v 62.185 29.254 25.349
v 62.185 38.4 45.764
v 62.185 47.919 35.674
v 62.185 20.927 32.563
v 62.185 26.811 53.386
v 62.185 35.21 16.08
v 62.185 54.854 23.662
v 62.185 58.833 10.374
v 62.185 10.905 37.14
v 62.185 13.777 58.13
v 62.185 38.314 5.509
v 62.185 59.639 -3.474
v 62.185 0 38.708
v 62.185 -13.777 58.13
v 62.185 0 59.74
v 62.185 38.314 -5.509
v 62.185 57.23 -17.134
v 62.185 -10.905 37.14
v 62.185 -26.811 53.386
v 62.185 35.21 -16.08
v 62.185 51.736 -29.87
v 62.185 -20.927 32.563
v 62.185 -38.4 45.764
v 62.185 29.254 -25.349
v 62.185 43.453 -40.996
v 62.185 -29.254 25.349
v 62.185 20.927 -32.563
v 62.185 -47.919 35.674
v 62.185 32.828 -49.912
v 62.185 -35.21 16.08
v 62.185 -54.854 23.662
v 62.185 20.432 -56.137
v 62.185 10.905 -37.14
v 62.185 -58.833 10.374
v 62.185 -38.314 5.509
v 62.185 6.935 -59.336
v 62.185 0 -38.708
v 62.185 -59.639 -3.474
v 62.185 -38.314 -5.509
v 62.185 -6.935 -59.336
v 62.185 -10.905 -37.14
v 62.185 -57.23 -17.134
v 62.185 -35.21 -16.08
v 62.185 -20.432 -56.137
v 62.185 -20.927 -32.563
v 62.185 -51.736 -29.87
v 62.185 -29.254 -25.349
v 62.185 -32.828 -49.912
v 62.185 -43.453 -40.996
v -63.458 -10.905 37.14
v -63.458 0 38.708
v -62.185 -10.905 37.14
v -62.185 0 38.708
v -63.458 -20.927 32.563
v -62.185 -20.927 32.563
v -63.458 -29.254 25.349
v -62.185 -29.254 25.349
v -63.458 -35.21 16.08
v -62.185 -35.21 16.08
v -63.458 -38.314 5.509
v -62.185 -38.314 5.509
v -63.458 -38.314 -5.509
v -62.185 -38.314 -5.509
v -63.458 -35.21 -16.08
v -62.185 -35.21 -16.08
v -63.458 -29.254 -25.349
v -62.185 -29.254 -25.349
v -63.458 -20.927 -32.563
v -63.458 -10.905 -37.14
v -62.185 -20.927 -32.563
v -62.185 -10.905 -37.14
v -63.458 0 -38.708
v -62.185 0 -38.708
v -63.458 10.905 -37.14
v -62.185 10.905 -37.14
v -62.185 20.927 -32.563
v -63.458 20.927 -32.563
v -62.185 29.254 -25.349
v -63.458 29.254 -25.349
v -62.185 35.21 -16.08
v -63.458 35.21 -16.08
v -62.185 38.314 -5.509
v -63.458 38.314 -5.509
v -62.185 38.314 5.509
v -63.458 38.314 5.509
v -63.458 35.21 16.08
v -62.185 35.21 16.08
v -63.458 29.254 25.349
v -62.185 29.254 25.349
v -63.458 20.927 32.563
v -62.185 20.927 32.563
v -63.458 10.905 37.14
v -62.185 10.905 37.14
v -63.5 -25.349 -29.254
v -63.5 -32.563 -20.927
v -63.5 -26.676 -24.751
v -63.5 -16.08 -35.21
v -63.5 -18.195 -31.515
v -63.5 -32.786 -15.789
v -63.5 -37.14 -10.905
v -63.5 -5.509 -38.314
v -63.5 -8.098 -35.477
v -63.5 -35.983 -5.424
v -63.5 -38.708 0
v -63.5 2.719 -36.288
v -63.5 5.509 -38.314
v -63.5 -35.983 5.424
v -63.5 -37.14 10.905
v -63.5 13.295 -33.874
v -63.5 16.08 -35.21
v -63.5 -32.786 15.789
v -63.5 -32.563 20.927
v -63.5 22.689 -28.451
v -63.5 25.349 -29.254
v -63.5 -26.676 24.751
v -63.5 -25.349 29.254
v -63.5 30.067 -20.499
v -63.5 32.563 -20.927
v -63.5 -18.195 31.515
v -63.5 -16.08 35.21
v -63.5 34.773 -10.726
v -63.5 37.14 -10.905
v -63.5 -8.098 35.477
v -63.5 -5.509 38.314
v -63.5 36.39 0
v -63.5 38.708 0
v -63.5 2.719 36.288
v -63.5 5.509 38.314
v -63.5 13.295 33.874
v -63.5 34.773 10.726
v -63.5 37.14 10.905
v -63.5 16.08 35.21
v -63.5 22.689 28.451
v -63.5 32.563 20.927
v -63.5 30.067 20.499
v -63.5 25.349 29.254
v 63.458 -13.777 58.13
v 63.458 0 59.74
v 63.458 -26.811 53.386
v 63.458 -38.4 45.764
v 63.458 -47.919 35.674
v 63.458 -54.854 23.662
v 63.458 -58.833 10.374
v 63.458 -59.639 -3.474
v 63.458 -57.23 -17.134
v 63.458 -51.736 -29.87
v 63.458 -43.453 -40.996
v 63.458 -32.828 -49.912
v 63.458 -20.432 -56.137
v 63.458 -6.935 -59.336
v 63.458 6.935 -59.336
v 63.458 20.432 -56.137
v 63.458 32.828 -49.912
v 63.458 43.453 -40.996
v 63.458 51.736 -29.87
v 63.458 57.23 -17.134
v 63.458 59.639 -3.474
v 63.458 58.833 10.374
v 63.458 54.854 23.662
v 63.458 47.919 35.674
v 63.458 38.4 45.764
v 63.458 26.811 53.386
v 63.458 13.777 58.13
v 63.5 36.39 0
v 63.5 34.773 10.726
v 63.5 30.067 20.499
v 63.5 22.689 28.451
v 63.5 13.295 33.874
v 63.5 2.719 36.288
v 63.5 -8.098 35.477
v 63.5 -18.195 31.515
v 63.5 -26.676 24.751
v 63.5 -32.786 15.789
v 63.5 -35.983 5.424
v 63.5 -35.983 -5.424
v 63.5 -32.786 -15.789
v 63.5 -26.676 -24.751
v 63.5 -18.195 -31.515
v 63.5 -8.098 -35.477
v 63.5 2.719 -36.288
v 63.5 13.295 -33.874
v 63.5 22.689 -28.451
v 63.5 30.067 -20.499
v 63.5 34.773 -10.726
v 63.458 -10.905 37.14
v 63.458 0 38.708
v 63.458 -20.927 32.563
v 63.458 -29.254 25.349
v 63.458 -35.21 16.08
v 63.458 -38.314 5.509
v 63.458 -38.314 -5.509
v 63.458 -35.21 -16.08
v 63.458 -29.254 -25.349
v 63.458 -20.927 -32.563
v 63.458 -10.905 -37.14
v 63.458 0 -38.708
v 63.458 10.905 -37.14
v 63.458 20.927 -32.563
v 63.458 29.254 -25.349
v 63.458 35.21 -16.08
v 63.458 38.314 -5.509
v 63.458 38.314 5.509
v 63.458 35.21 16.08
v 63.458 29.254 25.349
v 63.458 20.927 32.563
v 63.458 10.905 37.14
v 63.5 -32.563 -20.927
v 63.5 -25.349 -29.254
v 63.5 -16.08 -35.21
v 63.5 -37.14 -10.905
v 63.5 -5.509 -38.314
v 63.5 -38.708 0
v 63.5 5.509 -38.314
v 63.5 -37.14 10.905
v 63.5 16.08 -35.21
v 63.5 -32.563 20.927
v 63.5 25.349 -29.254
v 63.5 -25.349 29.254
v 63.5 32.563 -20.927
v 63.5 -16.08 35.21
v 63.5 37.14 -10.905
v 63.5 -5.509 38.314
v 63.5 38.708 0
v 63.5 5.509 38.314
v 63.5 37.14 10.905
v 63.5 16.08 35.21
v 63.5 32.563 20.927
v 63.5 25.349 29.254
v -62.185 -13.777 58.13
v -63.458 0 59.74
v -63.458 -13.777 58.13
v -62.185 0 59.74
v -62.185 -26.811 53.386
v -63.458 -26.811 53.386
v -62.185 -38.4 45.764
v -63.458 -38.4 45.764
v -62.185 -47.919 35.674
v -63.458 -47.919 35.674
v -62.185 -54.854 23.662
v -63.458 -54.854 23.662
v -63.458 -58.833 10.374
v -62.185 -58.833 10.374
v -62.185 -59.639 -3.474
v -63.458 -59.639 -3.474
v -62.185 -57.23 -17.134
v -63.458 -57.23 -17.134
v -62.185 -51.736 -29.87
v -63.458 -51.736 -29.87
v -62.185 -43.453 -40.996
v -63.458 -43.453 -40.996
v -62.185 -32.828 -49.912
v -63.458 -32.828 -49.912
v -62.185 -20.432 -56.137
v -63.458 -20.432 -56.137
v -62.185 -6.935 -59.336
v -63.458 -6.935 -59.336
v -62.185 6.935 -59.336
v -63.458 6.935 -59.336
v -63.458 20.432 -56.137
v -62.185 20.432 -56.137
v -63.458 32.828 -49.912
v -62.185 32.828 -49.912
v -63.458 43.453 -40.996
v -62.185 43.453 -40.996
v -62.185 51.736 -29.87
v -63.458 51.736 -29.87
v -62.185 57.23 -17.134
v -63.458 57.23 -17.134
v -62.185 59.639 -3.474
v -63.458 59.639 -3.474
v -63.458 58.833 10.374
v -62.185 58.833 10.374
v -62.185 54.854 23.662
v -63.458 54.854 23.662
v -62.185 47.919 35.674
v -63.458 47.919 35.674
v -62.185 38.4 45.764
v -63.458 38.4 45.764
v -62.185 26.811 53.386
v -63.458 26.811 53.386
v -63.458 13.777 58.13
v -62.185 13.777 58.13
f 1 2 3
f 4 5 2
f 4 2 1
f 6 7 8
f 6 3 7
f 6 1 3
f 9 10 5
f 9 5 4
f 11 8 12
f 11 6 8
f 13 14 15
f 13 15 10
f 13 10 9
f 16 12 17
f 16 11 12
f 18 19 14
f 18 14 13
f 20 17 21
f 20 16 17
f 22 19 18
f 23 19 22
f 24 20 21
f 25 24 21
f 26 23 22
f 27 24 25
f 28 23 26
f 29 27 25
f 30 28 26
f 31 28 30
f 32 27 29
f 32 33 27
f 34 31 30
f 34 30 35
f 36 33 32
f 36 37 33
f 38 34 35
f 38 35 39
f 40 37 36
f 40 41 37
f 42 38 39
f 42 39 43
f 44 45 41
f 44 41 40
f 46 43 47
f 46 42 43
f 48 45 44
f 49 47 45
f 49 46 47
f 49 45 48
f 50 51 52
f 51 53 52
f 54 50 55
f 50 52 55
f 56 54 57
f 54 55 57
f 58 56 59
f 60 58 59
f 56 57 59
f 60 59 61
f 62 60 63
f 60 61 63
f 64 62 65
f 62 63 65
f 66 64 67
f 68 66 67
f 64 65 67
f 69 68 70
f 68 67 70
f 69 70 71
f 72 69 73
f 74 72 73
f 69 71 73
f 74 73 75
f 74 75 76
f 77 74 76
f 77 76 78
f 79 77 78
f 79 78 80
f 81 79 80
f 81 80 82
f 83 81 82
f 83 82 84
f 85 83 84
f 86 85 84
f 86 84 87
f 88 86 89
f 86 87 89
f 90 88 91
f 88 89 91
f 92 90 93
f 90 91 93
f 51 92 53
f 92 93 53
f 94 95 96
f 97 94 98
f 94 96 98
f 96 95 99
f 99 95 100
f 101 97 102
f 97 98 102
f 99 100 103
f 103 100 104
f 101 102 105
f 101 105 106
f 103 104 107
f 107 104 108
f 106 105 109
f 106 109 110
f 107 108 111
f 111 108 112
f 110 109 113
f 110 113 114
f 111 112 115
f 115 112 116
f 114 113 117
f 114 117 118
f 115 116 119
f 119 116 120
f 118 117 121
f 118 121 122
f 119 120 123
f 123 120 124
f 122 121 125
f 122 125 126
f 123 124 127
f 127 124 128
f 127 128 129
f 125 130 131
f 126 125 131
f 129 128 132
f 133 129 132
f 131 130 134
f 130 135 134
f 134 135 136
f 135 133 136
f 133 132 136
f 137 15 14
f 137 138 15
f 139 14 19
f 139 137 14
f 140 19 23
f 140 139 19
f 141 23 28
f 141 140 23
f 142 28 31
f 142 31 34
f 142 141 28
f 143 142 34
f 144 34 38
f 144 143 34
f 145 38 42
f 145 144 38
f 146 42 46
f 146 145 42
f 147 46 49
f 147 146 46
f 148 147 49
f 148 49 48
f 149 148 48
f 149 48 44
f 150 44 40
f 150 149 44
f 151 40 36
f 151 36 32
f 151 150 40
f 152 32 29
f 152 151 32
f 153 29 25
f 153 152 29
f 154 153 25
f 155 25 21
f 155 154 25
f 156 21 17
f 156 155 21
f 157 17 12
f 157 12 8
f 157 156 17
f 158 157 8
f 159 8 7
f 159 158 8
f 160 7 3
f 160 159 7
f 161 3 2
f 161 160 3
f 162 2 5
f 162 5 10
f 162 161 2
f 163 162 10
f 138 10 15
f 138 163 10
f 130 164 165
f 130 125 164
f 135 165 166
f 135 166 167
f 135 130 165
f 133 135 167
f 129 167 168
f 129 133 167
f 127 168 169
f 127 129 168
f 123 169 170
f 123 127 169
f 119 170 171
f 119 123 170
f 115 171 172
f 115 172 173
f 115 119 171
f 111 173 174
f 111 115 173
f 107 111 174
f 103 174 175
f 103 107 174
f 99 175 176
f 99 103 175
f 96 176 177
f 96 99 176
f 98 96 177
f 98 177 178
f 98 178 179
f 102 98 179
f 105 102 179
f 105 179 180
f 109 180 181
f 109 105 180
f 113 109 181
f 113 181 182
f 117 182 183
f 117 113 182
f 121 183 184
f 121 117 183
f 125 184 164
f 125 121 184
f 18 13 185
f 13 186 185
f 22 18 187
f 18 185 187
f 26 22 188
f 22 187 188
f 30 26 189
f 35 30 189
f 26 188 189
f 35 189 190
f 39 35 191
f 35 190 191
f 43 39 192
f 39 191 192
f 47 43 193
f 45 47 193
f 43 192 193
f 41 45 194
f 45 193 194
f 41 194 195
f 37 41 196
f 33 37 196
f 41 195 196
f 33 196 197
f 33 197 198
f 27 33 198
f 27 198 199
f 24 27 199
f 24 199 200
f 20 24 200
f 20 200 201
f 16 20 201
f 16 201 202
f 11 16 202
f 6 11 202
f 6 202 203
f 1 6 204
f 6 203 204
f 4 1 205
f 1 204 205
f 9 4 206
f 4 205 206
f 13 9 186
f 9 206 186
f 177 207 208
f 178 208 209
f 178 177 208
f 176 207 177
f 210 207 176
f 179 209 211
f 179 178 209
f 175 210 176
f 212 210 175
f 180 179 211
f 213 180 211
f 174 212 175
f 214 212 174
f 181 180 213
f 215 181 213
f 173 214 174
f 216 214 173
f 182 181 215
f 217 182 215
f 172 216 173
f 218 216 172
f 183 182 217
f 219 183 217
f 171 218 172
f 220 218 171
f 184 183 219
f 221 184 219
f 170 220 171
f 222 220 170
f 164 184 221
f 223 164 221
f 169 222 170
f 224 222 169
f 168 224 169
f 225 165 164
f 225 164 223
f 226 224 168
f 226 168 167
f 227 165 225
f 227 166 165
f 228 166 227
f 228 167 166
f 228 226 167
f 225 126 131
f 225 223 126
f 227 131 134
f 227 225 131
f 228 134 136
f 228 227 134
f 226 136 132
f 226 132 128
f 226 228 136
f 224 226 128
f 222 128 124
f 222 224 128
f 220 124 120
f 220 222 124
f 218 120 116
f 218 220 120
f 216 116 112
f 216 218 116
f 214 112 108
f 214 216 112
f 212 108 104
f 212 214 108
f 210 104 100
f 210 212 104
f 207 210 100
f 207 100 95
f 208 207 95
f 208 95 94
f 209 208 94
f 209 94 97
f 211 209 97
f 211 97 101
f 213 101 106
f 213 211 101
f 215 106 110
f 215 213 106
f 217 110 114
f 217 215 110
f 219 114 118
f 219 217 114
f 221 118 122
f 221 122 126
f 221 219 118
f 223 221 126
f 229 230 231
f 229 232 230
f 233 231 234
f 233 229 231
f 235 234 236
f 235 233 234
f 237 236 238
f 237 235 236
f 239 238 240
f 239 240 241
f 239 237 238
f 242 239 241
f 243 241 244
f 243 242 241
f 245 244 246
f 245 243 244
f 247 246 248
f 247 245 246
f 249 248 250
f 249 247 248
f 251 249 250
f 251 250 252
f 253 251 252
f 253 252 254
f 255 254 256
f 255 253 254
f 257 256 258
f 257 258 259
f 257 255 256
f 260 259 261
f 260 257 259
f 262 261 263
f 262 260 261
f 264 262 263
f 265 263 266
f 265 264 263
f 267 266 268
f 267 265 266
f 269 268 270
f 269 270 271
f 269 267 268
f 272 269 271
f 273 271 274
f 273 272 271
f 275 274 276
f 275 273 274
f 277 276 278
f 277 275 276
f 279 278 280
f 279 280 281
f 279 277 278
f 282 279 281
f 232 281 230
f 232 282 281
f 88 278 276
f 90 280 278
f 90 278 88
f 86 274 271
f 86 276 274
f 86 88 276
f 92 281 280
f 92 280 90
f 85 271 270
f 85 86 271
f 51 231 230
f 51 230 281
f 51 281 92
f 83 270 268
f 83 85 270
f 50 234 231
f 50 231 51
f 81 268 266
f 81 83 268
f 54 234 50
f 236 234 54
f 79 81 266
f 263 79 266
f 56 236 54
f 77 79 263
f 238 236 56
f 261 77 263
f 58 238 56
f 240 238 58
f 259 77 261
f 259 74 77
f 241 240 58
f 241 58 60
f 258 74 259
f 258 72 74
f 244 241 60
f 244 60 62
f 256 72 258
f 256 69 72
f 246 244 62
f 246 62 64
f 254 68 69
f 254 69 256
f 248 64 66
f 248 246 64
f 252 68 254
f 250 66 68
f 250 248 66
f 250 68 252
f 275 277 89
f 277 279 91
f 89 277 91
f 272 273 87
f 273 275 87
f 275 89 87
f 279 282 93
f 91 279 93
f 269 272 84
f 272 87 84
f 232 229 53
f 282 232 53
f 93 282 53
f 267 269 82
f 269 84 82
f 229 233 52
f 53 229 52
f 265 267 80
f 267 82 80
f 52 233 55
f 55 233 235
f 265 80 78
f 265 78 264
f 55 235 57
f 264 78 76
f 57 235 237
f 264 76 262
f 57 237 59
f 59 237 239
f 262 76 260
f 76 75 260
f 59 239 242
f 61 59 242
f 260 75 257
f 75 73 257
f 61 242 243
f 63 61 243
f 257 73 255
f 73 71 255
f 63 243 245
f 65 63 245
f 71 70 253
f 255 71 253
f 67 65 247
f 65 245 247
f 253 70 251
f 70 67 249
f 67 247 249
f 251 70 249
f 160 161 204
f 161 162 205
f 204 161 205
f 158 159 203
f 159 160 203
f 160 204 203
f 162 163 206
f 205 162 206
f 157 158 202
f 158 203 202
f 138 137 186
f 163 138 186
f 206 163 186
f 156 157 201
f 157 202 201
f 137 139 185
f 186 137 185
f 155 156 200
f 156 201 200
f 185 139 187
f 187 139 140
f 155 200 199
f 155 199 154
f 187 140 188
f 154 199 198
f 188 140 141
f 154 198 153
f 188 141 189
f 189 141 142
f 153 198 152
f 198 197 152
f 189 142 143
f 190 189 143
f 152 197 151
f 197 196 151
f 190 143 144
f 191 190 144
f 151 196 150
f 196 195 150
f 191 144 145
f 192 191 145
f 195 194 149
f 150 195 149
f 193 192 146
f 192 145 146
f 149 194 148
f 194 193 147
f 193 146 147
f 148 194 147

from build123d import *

# Parameters (mm, degrees)
F0_R     = 38.708294
F0_R_2   = 36.389841
F1_DEPTH = 63.5
F3_W     = 1.273778
F3_H     = 21.031866


with BuildPart() as f1:
    # F0 (on Right) → F1 (new body, symmetric)
    with BuildSketch(Plane.YZ):
        Circle(F0_R)
        Circle(F0_R_2, mode=Mode.SUBTRACT)
    extrude(amount=F1_DEPTH, both=True)


with BuildPart() as f4:
    # F3 (on Front) → F4 (revolve)
    with BuildSketch(Plane.XZ):
        with Locations((62.821457, 49.224227)):
            Rectangle(F3_W, F3_H)
        with Locations((-62.821457, 49.224227)):
            Rectangle(F3_W, F3_H)
    revolve(axis=Axis((1.114558, 0, 0), (1, 0, 0)))


solid = Compound([f1.part, f4.part])
